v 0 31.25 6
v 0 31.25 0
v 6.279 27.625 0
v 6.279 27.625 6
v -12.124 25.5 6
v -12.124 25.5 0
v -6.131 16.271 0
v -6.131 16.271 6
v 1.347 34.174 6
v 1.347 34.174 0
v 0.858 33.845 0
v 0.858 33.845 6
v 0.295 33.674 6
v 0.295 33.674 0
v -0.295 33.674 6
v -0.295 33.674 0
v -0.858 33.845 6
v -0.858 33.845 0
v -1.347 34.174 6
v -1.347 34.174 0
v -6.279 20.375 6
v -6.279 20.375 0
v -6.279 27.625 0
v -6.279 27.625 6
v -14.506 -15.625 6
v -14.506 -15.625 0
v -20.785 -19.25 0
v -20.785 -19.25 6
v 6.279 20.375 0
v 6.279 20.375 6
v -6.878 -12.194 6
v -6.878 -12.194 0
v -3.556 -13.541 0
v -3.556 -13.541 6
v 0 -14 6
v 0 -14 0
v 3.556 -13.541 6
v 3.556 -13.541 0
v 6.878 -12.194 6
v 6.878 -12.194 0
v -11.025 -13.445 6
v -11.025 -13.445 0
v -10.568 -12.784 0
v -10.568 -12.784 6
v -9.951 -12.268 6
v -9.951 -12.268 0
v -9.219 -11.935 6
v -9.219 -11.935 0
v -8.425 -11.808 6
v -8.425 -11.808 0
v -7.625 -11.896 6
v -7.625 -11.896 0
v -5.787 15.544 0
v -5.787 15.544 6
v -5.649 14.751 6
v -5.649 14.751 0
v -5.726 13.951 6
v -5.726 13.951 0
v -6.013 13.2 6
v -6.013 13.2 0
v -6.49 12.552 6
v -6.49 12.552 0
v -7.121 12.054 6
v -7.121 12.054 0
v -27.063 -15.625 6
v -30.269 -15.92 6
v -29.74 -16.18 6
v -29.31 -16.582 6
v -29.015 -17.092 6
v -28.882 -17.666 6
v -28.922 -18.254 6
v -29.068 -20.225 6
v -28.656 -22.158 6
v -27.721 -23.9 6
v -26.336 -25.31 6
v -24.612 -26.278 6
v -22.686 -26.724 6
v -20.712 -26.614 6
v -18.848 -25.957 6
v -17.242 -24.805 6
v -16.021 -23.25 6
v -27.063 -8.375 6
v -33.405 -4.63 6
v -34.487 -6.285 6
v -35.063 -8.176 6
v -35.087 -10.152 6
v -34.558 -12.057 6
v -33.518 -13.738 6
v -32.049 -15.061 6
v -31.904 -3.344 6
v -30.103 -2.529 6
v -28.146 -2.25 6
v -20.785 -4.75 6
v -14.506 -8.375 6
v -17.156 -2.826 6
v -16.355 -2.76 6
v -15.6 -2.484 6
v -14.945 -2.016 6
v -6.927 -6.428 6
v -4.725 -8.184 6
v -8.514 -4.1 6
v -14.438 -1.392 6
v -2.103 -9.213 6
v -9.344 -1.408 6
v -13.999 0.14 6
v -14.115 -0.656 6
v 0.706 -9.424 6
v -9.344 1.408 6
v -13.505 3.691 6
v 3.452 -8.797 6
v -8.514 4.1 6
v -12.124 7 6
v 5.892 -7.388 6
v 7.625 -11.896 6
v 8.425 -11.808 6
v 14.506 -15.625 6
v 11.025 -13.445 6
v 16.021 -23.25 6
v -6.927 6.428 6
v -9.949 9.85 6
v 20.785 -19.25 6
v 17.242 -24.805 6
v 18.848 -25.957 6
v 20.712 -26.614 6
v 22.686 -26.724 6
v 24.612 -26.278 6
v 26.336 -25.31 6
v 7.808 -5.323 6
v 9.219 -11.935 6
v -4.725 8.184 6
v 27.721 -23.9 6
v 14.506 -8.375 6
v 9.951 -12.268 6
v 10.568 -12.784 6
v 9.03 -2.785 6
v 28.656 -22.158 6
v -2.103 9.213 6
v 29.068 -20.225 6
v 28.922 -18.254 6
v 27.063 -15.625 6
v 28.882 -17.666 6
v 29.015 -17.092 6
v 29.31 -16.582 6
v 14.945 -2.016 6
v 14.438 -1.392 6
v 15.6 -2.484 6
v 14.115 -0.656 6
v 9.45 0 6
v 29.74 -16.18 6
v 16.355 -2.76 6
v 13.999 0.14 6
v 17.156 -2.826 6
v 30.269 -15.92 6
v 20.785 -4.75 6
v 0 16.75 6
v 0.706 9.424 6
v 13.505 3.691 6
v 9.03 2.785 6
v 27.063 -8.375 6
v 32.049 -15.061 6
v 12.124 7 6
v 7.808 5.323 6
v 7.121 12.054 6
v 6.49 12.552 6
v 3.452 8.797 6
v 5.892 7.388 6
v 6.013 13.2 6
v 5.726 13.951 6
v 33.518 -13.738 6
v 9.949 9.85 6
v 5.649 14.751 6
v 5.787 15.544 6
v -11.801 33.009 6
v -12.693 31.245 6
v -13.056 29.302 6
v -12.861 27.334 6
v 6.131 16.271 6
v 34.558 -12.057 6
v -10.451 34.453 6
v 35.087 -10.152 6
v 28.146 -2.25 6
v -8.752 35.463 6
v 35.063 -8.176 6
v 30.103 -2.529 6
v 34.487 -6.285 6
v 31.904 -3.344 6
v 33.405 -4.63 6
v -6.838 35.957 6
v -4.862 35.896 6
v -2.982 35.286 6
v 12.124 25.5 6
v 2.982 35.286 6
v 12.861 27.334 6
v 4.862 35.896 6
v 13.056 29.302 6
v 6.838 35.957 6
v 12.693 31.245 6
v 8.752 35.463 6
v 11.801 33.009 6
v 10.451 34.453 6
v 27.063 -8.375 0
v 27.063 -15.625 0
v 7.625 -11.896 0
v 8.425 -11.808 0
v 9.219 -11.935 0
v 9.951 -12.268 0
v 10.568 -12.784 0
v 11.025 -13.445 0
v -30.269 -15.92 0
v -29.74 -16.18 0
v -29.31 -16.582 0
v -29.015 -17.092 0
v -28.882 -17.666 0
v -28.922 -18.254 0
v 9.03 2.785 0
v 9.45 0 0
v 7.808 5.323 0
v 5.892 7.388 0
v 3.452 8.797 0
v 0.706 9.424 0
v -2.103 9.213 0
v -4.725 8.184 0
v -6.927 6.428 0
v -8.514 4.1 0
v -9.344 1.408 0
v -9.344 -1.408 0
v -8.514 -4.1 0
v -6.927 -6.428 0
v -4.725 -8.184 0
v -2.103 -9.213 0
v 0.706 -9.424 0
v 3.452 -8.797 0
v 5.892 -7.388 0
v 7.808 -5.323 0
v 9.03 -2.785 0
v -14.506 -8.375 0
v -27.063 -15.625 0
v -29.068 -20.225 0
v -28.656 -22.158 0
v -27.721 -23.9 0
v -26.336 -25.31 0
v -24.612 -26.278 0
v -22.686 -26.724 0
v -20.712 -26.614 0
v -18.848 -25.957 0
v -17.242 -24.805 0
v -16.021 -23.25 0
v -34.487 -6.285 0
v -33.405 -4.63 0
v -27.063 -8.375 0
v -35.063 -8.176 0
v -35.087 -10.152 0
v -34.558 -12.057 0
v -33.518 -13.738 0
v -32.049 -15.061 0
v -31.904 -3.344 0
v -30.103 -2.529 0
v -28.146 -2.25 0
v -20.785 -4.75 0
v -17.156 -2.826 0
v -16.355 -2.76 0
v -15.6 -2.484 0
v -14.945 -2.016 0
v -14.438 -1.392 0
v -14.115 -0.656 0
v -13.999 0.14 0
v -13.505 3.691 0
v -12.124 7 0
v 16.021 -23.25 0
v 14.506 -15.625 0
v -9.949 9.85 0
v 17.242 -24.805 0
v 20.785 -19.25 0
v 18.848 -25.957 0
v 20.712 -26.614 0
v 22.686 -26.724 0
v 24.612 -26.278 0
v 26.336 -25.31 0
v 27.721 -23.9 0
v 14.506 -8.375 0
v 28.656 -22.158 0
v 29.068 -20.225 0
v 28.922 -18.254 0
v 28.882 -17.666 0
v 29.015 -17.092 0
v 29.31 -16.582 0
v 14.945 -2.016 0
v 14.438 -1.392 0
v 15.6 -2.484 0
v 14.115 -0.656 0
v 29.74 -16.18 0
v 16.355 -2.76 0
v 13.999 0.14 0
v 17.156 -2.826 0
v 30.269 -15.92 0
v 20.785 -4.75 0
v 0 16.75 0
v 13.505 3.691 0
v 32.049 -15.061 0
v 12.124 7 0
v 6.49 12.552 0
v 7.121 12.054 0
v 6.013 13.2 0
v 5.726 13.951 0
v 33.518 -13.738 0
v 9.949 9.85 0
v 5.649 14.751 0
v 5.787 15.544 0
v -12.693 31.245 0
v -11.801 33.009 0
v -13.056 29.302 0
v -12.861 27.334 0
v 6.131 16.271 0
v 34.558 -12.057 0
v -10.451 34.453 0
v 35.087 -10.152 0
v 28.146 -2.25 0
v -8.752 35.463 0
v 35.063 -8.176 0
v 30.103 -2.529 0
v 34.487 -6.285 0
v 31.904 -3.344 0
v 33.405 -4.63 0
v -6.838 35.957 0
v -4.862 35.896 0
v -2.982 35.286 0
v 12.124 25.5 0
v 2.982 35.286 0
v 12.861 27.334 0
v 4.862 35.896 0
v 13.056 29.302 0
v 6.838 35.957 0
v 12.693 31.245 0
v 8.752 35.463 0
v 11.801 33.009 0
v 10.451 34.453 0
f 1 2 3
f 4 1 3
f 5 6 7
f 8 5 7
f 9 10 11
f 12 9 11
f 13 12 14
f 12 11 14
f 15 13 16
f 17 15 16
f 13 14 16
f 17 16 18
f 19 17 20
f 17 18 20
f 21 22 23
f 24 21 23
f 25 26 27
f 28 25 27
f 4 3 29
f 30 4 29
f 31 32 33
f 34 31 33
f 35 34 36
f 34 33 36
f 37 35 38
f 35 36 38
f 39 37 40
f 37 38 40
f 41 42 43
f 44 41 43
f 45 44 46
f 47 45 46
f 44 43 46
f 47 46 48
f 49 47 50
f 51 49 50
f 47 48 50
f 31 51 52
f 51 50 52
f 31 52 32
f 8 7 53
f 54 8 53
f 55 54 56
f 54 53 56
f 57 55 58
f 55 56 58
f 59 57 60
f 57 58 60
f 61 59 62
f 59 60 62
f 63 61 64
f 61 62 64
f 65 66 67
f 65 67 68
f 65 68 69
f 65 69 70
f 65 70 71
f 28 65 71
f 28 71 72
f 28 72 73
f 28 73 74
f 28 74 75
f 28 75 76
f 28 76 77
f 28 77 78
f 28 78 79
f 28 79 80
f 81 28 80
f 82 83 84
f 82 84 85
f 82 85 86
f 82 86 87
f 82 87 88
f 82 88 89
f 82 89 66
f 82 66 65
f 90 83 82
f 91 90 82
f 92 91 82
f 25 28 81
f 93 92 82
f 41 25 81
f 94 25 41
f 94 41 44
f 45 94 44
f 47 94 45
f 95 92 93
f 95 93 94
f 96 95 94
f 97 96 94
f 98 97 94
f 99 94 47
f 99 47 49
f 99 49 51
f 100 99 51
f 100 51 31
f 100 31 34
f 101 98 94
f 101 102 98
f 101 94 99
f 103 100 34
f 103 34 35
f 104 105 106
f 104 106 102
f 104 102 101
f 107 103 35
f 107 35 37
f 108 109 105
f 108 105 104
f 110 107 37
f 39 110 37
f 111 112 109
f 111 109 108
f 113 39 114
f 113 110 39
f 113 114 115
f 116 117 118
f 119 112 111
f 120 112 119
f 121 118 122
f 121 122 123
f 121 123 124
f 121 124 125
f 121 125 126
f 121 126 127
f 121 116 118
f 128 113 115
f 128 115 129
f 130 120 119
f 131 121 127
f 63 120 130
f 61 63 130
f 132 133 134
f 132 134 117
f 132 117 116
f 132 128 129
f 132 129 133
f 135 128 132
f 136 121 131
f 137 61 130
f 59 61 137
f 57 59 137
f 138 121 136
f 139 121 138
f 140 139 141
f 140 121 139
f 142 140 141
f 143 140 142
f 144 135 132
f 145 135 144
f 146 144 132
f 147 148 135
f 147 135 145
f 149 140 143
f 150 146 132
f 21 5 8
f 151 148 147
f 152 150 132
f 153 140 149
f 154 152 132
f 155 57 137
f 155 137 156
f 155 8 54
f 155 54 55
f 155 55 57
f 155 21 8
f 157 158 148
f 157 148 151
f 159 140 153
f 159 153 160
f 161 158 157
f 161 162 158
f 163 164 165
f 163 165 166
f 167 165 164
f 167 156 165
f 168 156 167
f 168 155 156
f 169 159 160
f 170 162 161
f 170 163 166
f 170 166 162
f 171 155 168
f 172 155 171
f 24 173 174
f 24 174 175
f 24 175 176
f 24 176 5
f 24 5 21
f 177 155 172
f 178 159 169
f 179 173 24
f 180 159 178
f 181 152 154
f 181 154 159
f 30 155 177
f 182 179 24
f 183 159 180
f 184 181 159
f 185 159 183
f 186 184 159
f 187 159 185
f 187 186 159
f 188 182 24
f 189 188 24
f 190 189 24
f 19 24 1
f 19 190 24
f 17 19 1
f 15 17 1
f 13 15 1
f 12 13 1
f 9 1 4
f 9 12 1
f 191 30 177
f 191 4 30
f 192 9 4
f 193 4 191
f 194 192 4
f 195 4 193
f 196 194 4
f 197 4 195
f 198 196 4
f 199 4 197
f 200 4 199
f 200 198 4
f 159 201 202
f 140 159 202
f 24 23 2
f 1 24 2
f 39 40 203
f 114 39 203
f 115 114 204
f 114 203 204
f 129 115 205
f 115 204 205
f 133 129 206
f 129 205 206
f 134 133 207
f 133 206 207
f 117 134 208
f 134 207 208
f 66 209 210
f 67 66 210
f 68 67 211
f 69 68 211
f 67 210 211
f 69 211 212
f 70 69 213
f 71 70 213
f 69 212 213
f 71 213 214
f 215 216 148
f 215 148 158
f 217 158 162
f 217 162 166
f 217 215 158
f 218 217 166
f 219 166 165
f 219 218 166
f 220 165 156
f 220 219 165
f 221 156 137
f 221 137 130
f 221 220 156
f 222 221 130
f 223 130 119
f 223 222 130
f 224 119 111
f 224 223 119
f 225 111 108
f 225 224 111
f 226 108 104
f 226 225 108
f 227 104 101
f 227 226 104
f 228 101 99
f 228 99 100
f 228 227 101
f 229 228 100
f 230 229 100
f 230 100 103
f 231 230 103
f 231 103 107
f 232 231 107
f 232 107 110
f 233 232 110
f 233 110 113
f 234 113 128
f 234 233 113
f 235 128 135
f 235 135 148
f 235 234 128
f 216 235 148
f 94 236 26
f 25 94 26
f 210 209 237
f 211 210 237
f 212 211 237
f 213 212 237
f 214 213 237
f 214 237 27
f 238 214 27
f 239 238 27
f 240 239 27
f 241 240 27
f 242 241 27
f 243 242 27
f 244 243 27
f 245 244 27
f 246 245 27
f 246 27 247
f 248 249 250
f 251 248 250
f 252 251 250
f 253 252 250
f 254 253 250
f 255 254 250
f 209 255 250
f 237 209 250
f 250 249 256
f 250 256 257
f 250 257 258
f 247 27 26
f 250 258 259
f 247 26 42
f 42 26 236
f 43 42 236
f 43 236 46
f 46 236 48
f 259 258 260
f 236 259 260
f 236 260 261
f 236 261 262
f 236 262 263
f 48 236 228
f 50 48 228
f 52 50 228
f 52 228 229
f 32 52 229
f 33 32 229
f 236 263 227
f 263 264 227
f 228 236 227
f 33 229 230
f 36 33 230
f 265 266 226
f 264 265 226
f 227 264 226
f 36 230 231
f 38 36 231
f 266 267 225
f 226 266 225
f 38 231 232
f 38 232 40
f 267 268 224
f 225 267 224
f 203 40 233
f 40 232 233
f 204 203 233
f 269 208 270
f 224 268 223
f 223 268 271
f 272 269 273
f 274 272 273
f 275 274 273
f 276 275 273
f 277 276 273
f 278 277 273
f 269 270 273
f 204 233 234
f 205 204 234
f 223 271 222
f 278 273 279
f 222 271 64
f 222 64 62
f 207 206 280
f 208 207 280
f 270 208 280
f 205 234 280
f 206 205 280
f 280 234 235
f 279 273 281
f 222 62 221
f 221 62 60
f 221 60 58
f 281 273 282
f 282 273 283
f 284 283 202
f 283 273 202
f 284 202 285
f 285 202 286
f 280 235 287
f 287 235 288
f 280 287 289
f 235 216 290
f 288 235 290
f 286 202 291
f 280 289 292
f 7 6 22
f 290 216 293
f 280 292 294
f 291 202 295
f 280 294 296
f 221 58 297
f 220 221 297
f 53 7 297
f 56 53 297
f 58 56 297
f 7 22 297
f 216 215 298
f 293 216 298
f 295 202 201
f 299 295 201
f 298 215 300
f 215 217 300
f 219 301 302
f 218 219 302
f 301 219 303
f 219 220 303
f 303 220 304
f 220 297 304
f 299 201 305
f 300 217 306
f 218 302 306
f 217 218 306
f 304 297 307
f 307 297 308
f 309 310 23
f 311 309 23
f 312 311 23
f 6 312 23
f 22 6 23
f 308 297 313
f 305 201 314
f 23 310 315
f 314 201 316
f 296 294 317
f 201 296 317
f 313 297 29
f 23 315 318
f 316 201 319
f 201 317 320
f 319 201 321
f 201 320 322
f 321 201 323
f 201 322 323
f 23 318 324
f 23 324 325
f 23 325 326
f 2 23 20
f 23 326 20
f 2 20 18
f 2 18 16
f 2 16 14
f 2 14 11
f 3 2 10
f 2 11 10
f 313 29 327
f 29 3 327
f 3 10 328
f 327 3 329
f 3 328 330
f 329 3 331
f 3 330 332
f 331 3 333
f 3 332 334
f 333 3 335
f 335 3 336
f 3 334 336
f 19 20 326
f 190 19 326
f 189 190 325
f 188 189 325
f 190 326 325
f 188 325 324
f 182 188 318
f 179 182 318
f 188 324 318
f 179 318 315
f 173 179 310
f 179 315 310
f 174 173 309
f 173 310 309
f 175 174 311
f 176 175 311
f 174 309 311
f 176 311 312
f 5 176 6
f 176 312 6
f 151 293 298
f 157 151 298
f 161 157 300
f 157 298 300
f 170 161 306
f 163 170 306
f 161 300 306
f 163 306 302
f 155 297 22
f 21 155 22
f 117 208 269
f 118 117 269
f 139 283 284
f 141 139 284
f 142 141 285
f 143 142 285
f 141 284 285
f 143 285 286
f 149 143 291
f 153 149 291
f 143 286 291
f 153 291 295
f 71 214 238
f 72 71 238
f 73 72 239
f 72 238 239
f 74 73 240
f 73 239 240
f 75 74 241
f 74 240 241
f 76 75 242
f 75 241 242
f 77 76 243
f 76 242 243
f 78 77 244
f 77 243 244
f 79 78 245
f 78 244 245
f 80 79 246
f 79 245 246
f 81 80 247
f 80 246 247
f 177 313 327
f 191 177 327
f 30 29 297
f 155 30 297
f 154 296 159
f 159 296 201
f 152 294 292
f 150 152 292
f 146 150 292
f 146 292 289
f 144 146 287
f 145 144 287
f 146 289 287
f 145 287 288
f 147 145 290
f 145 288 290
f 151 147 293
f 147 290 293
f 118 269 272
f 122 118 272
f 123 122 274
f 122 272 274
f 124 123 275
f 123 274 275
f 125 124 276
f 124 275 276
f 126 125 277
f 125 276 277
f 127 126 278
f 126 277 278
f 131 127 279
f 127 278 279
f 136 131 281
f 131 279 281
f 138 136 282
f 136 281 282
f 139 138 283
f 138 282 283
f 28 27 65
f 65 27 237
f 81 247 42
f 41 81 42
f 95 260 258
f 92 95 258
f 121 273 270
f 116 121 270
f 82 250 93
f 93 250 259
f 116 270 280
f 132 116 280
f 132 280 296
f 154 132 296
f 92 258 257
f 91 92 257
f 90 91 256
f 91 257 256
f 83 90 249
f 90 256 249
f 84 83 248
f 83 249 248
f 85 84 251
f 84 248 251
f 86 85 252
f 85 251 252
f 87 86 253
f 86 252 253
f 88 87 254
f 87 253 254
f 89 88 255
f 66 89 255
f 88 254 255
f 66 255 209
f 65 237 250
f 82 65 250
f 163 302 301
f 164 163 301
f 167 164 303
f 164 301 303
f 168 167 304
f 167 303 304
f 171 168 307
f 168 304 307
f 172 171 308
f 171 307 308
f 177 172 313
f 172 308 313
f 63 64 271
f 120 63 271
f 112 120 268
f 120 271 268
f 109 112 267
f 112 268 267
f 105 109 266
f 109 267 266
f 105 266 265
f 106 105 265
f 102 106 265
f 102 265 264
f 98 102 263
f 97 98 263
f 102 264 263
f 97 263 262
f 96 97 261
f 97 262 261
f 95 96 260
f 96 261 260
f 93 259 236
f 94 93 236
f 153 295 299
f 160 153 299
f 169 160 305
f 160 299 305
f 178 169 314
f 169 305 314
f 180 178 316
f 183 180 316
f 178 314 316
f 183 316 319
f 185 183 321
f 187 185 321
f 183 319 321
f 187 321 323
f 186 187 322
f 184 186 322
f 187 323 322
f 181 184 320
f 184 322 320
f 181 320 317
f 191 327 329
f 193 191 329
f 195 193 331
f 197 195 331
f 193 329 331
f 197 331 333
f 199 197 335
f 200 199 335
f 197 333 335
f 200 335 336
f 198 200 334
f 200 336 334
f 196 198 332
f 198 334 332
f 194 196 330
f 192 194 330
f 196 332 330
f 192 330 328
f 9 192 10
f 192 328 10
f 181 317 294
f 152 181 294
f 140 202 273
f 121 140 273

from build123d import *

# Parameters (mm, degrees)
F0_R     = 14
F0_R_2   = 9.45
F1_DEPTH = 6
F3_DEPTH = 6


# Not quite as in the source:
# - a feature names something its author has since deleted; it is built from what else it names


with BuildPart() as f1:
    # F0 (on Top) → F1 (new body)
    with BuildSketch(Plane.XY):
        Circle(F0_R)
        Circle(F0_R_2, mode=Mode.SUBTRACT)
    extrude(amount=F1_DEPTH)

    # F2 (on Top) → F3 (join)
    with BuildSketch(Plane.XY):
        with BuildLine():
            ThreePointArc((7.1208542294, 12.0537726478), (5.7261776623, 13.9509775601), (6.1307398604, 16.2706410345))
            Line((6.1307398604, 16.2706410345), (12.124355653, 25.5))
            ThreePointArc((12.124355653, 25.5), (10.4510884103, 34.4532067527), (1.3471506281, 34.1738301594))
            ThreePointArc((1.3471506281, 34.1738301594), (0, 33.6520673478), (-1.3471506281, 34.1738301594))
            ThreePointArc((-1.3471506281, 34.1738301594), (-10.4510884103, 34.4532067527), (-12.124355653, 25.5))
            Line((-12.124355653, 25.5), (-6.1307398604, 16.2706410345))
            ThreePointArc((-6.1307398604, 16.2706410345), (-5.7261776623, 13.9509775601), (-7.1208542294, 12.0537726478))
            ThreePointArc((-7.1208542294, 12.0537726478), (0, 14), (7.1208542294, 12.0537726478))
        make_face()
        Polygon((-6.2786841774, 27.625), (0, 31.25), (6.2786841774, 27.625), (6.2786841774, 20.375), (0, 16.75), (-6.2786841774, 20.375), align=None, mode=Mode.SUBTRACT)
        with BuildLine():
            ThreePointArc((17.1561584019, -2.8259440541), (14.9449898058, -2.016473458), (13.9993004391, 0.1399543354))
            ThreePointArc((13.9993004391, 0.1399543354), (13.9998251087, 0.0699780419), (14, 0))
            ThreePointArc((14, 0), (12.0892151717, -7.0605153163), (6.8784462097, -12.1937269832))
            ThreePointArc((6.8784462097, -12.1937269832), (9.2188121436, -11.9345041022), (11.0254185415, -13.4446969803))
            Line((11.0254185415, -13.4446969803), (16.02146997, -23.25))
            ThreePointArc((16.02146997, -23.25), (24.6118080845, -26.2775114368), (28.9218297486, -18.2535817464))
            ThreePointArc((28.9218297486, -18.2535817464), (29.1435452131, -16.8260336739), (30.2689803767, -15.920248413))
            ThreePointArc((30.2689803767, -15.920248413), (35.0628964948, -8.1756953159), (28.145825623, -2.25))
            Line((28.145825623, -2.25), (17.1561584019, -2.8259440541))
        make_face()
        Polygon((27.0632938683, -15.625), (20.7846096908, -19.25), (14.5059255134, -15.625), (14.5059255134, -8.375), (20.7846096908, -4.75), (27.0632938683, -8.375), align=None, mode=Mode.SUBTRACT)
        with BuildLine():
            ThreePointArc((-6.8784462097, -12.1937269832), (-12.124355653, -7), (-13.9993004391, 0.1399543354))
            ThreePointArc((-13.9993004391, 0.1399543354), (-14.9449898058, -2.016473458), (-17.1561584019, -2.8259440541))
            Line((-17.1561584019, -2.8259440541), (-28.145825623, -2.25))
            ThreePointArc((-28.145825623, -2.25), (-35.0628964948, -8.1756953159), (-30.2689803767, -15.920248413))
            ThreePointArc((-30.2689803767, -15.920248413), (-29.1435452131, -16.8260336739), (-28.9218297486, -18.2535817464))
            ThreePointArc((-28.9218297486, -18.2535817464), (-24.6118080845, -26.2775114368), (-16.02146997, -23.25))
            Line((-16.02146997, -23.25), (-11.0254185415, -13.4446969803))
            ThreePointArc((-11.0254185415, -13.4446969803), (-9.2188121436, -11.9345041022), (-6.8784462097, -12.1937269832))
        make_face()
        Polygon((-27.0632938683, -15.625), (-27.0632938683, -8.375), (-20.7846096908, -4.75), (-14.5059255134, -8.375), (-14.5059255134, -15.625), (-20.7846096908, -19.25), align=None, mode=Mode.SUBTRACT)
    extrude(amount=F3_DEPTH)


solid = f1.part
